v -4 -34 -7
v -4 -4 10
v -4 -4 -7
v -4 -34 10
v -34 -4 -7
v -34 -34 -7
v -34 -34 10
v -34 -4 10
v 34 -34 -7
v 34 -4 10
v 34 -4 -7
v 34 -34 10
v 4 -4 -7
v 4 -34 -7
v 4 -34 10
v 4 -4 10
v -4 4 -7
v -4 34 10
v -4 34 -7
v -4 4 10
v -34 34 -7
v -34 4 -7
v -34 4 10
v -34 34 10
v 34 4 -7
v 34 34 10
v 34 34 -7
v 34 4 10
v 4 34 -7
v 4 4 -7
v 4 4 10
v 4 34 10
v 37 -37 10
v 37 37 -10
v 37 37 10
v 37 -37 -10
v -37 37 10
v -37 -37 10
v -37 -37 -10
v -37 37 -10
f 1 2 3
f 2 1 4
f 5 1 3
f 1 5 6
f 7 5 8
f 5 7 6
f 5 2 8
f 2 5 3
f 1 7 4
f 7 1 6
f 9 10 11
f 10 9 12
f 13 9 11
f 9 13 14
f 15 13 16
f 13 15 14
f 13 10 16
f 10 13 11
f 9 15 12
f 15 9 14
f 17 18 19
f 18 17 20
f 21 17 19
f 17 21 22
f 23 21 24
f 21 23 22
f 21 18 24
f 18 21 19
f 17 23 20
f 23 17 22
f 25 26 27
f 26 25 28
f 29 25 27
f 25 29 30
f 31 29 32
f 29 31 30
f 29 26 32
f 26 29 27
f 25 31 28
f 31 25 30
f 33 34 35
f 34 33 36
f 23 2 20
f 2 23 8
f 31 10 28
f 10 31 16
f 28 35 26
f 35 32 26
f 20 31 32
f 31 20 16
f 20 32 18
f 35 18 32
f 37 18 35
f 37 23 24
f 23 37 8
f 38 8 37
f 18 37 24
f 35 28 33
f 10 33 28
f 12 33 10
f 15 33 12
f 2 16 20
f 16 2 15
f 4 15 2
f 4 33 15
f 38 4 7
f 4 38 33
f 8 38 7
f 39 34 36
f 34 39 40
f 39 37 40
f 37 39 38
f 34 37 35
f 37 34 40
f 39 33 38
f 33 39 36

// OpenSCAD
$fn = 32;

// ----------------------------------------------------------------------
// Pocket plate 74 x 74 x 20
// 2 x 2 pockets 30 mm square, 17 mm deep
// ----------------------------------------------------------------------

// --- parameters (mm) ---
thickness = 20;  // plate thickness
floor_t = 3;     // material left under each pocket
pocket = 30;     // pocket side length
pitch_x = 38;    // pocket pitch along X
pitch_y = 38;    // pocket pitch along Y
cols = 2;        // pockets per row
rows = 2;        // rows of pockets

// --- derived feature positions (mm) ---
depth = thickness - floor_t;        // = 17   pocket depth, down to the floor
span_x = (cols - 1) * pitch_x;      // = 38   distance between outer pockets
span_y = (rows - 1) * pitch_y;      // = 38   distance between outer pocket rows
origin_x = -span_x / 2;             // = -19   X of the first pocket
origin_y = -span_y / 2;             // = -19   Y of the first pocket
plate = [span_x + pocket + 6, span_y + pocket + 6, thickness];  // = [74, 74, 20]   overall size: pockets plus 3 mm of wall on each side
feature_centers = [
  [origin_x + 0 * pitch_x, origin_y + 0 * pitch_y],
  [origin_x + 1 * pitch_x, origin_y + 0 * pitch_y],
  [origin_x + 0 * pitch_x, origin_y + 1 * pitch_y],
  [origin_x + 1 * pitch_x, origin_y + 1 * pitch_y]
];   // pocket centres, used verbatim by the cutter loop

// plate outline, then one pocket per centre in feature_centers
difference() {
  cube(plate, center = true);
  for (centre = feature_centers)
    translate([centre[0] - pocket / 2, centre[1] - pocket / 2, plate[2] / 2 - depth])
      cube([pocket, pocket, depth + 1]);  // centred on the declared pocket centre
}
